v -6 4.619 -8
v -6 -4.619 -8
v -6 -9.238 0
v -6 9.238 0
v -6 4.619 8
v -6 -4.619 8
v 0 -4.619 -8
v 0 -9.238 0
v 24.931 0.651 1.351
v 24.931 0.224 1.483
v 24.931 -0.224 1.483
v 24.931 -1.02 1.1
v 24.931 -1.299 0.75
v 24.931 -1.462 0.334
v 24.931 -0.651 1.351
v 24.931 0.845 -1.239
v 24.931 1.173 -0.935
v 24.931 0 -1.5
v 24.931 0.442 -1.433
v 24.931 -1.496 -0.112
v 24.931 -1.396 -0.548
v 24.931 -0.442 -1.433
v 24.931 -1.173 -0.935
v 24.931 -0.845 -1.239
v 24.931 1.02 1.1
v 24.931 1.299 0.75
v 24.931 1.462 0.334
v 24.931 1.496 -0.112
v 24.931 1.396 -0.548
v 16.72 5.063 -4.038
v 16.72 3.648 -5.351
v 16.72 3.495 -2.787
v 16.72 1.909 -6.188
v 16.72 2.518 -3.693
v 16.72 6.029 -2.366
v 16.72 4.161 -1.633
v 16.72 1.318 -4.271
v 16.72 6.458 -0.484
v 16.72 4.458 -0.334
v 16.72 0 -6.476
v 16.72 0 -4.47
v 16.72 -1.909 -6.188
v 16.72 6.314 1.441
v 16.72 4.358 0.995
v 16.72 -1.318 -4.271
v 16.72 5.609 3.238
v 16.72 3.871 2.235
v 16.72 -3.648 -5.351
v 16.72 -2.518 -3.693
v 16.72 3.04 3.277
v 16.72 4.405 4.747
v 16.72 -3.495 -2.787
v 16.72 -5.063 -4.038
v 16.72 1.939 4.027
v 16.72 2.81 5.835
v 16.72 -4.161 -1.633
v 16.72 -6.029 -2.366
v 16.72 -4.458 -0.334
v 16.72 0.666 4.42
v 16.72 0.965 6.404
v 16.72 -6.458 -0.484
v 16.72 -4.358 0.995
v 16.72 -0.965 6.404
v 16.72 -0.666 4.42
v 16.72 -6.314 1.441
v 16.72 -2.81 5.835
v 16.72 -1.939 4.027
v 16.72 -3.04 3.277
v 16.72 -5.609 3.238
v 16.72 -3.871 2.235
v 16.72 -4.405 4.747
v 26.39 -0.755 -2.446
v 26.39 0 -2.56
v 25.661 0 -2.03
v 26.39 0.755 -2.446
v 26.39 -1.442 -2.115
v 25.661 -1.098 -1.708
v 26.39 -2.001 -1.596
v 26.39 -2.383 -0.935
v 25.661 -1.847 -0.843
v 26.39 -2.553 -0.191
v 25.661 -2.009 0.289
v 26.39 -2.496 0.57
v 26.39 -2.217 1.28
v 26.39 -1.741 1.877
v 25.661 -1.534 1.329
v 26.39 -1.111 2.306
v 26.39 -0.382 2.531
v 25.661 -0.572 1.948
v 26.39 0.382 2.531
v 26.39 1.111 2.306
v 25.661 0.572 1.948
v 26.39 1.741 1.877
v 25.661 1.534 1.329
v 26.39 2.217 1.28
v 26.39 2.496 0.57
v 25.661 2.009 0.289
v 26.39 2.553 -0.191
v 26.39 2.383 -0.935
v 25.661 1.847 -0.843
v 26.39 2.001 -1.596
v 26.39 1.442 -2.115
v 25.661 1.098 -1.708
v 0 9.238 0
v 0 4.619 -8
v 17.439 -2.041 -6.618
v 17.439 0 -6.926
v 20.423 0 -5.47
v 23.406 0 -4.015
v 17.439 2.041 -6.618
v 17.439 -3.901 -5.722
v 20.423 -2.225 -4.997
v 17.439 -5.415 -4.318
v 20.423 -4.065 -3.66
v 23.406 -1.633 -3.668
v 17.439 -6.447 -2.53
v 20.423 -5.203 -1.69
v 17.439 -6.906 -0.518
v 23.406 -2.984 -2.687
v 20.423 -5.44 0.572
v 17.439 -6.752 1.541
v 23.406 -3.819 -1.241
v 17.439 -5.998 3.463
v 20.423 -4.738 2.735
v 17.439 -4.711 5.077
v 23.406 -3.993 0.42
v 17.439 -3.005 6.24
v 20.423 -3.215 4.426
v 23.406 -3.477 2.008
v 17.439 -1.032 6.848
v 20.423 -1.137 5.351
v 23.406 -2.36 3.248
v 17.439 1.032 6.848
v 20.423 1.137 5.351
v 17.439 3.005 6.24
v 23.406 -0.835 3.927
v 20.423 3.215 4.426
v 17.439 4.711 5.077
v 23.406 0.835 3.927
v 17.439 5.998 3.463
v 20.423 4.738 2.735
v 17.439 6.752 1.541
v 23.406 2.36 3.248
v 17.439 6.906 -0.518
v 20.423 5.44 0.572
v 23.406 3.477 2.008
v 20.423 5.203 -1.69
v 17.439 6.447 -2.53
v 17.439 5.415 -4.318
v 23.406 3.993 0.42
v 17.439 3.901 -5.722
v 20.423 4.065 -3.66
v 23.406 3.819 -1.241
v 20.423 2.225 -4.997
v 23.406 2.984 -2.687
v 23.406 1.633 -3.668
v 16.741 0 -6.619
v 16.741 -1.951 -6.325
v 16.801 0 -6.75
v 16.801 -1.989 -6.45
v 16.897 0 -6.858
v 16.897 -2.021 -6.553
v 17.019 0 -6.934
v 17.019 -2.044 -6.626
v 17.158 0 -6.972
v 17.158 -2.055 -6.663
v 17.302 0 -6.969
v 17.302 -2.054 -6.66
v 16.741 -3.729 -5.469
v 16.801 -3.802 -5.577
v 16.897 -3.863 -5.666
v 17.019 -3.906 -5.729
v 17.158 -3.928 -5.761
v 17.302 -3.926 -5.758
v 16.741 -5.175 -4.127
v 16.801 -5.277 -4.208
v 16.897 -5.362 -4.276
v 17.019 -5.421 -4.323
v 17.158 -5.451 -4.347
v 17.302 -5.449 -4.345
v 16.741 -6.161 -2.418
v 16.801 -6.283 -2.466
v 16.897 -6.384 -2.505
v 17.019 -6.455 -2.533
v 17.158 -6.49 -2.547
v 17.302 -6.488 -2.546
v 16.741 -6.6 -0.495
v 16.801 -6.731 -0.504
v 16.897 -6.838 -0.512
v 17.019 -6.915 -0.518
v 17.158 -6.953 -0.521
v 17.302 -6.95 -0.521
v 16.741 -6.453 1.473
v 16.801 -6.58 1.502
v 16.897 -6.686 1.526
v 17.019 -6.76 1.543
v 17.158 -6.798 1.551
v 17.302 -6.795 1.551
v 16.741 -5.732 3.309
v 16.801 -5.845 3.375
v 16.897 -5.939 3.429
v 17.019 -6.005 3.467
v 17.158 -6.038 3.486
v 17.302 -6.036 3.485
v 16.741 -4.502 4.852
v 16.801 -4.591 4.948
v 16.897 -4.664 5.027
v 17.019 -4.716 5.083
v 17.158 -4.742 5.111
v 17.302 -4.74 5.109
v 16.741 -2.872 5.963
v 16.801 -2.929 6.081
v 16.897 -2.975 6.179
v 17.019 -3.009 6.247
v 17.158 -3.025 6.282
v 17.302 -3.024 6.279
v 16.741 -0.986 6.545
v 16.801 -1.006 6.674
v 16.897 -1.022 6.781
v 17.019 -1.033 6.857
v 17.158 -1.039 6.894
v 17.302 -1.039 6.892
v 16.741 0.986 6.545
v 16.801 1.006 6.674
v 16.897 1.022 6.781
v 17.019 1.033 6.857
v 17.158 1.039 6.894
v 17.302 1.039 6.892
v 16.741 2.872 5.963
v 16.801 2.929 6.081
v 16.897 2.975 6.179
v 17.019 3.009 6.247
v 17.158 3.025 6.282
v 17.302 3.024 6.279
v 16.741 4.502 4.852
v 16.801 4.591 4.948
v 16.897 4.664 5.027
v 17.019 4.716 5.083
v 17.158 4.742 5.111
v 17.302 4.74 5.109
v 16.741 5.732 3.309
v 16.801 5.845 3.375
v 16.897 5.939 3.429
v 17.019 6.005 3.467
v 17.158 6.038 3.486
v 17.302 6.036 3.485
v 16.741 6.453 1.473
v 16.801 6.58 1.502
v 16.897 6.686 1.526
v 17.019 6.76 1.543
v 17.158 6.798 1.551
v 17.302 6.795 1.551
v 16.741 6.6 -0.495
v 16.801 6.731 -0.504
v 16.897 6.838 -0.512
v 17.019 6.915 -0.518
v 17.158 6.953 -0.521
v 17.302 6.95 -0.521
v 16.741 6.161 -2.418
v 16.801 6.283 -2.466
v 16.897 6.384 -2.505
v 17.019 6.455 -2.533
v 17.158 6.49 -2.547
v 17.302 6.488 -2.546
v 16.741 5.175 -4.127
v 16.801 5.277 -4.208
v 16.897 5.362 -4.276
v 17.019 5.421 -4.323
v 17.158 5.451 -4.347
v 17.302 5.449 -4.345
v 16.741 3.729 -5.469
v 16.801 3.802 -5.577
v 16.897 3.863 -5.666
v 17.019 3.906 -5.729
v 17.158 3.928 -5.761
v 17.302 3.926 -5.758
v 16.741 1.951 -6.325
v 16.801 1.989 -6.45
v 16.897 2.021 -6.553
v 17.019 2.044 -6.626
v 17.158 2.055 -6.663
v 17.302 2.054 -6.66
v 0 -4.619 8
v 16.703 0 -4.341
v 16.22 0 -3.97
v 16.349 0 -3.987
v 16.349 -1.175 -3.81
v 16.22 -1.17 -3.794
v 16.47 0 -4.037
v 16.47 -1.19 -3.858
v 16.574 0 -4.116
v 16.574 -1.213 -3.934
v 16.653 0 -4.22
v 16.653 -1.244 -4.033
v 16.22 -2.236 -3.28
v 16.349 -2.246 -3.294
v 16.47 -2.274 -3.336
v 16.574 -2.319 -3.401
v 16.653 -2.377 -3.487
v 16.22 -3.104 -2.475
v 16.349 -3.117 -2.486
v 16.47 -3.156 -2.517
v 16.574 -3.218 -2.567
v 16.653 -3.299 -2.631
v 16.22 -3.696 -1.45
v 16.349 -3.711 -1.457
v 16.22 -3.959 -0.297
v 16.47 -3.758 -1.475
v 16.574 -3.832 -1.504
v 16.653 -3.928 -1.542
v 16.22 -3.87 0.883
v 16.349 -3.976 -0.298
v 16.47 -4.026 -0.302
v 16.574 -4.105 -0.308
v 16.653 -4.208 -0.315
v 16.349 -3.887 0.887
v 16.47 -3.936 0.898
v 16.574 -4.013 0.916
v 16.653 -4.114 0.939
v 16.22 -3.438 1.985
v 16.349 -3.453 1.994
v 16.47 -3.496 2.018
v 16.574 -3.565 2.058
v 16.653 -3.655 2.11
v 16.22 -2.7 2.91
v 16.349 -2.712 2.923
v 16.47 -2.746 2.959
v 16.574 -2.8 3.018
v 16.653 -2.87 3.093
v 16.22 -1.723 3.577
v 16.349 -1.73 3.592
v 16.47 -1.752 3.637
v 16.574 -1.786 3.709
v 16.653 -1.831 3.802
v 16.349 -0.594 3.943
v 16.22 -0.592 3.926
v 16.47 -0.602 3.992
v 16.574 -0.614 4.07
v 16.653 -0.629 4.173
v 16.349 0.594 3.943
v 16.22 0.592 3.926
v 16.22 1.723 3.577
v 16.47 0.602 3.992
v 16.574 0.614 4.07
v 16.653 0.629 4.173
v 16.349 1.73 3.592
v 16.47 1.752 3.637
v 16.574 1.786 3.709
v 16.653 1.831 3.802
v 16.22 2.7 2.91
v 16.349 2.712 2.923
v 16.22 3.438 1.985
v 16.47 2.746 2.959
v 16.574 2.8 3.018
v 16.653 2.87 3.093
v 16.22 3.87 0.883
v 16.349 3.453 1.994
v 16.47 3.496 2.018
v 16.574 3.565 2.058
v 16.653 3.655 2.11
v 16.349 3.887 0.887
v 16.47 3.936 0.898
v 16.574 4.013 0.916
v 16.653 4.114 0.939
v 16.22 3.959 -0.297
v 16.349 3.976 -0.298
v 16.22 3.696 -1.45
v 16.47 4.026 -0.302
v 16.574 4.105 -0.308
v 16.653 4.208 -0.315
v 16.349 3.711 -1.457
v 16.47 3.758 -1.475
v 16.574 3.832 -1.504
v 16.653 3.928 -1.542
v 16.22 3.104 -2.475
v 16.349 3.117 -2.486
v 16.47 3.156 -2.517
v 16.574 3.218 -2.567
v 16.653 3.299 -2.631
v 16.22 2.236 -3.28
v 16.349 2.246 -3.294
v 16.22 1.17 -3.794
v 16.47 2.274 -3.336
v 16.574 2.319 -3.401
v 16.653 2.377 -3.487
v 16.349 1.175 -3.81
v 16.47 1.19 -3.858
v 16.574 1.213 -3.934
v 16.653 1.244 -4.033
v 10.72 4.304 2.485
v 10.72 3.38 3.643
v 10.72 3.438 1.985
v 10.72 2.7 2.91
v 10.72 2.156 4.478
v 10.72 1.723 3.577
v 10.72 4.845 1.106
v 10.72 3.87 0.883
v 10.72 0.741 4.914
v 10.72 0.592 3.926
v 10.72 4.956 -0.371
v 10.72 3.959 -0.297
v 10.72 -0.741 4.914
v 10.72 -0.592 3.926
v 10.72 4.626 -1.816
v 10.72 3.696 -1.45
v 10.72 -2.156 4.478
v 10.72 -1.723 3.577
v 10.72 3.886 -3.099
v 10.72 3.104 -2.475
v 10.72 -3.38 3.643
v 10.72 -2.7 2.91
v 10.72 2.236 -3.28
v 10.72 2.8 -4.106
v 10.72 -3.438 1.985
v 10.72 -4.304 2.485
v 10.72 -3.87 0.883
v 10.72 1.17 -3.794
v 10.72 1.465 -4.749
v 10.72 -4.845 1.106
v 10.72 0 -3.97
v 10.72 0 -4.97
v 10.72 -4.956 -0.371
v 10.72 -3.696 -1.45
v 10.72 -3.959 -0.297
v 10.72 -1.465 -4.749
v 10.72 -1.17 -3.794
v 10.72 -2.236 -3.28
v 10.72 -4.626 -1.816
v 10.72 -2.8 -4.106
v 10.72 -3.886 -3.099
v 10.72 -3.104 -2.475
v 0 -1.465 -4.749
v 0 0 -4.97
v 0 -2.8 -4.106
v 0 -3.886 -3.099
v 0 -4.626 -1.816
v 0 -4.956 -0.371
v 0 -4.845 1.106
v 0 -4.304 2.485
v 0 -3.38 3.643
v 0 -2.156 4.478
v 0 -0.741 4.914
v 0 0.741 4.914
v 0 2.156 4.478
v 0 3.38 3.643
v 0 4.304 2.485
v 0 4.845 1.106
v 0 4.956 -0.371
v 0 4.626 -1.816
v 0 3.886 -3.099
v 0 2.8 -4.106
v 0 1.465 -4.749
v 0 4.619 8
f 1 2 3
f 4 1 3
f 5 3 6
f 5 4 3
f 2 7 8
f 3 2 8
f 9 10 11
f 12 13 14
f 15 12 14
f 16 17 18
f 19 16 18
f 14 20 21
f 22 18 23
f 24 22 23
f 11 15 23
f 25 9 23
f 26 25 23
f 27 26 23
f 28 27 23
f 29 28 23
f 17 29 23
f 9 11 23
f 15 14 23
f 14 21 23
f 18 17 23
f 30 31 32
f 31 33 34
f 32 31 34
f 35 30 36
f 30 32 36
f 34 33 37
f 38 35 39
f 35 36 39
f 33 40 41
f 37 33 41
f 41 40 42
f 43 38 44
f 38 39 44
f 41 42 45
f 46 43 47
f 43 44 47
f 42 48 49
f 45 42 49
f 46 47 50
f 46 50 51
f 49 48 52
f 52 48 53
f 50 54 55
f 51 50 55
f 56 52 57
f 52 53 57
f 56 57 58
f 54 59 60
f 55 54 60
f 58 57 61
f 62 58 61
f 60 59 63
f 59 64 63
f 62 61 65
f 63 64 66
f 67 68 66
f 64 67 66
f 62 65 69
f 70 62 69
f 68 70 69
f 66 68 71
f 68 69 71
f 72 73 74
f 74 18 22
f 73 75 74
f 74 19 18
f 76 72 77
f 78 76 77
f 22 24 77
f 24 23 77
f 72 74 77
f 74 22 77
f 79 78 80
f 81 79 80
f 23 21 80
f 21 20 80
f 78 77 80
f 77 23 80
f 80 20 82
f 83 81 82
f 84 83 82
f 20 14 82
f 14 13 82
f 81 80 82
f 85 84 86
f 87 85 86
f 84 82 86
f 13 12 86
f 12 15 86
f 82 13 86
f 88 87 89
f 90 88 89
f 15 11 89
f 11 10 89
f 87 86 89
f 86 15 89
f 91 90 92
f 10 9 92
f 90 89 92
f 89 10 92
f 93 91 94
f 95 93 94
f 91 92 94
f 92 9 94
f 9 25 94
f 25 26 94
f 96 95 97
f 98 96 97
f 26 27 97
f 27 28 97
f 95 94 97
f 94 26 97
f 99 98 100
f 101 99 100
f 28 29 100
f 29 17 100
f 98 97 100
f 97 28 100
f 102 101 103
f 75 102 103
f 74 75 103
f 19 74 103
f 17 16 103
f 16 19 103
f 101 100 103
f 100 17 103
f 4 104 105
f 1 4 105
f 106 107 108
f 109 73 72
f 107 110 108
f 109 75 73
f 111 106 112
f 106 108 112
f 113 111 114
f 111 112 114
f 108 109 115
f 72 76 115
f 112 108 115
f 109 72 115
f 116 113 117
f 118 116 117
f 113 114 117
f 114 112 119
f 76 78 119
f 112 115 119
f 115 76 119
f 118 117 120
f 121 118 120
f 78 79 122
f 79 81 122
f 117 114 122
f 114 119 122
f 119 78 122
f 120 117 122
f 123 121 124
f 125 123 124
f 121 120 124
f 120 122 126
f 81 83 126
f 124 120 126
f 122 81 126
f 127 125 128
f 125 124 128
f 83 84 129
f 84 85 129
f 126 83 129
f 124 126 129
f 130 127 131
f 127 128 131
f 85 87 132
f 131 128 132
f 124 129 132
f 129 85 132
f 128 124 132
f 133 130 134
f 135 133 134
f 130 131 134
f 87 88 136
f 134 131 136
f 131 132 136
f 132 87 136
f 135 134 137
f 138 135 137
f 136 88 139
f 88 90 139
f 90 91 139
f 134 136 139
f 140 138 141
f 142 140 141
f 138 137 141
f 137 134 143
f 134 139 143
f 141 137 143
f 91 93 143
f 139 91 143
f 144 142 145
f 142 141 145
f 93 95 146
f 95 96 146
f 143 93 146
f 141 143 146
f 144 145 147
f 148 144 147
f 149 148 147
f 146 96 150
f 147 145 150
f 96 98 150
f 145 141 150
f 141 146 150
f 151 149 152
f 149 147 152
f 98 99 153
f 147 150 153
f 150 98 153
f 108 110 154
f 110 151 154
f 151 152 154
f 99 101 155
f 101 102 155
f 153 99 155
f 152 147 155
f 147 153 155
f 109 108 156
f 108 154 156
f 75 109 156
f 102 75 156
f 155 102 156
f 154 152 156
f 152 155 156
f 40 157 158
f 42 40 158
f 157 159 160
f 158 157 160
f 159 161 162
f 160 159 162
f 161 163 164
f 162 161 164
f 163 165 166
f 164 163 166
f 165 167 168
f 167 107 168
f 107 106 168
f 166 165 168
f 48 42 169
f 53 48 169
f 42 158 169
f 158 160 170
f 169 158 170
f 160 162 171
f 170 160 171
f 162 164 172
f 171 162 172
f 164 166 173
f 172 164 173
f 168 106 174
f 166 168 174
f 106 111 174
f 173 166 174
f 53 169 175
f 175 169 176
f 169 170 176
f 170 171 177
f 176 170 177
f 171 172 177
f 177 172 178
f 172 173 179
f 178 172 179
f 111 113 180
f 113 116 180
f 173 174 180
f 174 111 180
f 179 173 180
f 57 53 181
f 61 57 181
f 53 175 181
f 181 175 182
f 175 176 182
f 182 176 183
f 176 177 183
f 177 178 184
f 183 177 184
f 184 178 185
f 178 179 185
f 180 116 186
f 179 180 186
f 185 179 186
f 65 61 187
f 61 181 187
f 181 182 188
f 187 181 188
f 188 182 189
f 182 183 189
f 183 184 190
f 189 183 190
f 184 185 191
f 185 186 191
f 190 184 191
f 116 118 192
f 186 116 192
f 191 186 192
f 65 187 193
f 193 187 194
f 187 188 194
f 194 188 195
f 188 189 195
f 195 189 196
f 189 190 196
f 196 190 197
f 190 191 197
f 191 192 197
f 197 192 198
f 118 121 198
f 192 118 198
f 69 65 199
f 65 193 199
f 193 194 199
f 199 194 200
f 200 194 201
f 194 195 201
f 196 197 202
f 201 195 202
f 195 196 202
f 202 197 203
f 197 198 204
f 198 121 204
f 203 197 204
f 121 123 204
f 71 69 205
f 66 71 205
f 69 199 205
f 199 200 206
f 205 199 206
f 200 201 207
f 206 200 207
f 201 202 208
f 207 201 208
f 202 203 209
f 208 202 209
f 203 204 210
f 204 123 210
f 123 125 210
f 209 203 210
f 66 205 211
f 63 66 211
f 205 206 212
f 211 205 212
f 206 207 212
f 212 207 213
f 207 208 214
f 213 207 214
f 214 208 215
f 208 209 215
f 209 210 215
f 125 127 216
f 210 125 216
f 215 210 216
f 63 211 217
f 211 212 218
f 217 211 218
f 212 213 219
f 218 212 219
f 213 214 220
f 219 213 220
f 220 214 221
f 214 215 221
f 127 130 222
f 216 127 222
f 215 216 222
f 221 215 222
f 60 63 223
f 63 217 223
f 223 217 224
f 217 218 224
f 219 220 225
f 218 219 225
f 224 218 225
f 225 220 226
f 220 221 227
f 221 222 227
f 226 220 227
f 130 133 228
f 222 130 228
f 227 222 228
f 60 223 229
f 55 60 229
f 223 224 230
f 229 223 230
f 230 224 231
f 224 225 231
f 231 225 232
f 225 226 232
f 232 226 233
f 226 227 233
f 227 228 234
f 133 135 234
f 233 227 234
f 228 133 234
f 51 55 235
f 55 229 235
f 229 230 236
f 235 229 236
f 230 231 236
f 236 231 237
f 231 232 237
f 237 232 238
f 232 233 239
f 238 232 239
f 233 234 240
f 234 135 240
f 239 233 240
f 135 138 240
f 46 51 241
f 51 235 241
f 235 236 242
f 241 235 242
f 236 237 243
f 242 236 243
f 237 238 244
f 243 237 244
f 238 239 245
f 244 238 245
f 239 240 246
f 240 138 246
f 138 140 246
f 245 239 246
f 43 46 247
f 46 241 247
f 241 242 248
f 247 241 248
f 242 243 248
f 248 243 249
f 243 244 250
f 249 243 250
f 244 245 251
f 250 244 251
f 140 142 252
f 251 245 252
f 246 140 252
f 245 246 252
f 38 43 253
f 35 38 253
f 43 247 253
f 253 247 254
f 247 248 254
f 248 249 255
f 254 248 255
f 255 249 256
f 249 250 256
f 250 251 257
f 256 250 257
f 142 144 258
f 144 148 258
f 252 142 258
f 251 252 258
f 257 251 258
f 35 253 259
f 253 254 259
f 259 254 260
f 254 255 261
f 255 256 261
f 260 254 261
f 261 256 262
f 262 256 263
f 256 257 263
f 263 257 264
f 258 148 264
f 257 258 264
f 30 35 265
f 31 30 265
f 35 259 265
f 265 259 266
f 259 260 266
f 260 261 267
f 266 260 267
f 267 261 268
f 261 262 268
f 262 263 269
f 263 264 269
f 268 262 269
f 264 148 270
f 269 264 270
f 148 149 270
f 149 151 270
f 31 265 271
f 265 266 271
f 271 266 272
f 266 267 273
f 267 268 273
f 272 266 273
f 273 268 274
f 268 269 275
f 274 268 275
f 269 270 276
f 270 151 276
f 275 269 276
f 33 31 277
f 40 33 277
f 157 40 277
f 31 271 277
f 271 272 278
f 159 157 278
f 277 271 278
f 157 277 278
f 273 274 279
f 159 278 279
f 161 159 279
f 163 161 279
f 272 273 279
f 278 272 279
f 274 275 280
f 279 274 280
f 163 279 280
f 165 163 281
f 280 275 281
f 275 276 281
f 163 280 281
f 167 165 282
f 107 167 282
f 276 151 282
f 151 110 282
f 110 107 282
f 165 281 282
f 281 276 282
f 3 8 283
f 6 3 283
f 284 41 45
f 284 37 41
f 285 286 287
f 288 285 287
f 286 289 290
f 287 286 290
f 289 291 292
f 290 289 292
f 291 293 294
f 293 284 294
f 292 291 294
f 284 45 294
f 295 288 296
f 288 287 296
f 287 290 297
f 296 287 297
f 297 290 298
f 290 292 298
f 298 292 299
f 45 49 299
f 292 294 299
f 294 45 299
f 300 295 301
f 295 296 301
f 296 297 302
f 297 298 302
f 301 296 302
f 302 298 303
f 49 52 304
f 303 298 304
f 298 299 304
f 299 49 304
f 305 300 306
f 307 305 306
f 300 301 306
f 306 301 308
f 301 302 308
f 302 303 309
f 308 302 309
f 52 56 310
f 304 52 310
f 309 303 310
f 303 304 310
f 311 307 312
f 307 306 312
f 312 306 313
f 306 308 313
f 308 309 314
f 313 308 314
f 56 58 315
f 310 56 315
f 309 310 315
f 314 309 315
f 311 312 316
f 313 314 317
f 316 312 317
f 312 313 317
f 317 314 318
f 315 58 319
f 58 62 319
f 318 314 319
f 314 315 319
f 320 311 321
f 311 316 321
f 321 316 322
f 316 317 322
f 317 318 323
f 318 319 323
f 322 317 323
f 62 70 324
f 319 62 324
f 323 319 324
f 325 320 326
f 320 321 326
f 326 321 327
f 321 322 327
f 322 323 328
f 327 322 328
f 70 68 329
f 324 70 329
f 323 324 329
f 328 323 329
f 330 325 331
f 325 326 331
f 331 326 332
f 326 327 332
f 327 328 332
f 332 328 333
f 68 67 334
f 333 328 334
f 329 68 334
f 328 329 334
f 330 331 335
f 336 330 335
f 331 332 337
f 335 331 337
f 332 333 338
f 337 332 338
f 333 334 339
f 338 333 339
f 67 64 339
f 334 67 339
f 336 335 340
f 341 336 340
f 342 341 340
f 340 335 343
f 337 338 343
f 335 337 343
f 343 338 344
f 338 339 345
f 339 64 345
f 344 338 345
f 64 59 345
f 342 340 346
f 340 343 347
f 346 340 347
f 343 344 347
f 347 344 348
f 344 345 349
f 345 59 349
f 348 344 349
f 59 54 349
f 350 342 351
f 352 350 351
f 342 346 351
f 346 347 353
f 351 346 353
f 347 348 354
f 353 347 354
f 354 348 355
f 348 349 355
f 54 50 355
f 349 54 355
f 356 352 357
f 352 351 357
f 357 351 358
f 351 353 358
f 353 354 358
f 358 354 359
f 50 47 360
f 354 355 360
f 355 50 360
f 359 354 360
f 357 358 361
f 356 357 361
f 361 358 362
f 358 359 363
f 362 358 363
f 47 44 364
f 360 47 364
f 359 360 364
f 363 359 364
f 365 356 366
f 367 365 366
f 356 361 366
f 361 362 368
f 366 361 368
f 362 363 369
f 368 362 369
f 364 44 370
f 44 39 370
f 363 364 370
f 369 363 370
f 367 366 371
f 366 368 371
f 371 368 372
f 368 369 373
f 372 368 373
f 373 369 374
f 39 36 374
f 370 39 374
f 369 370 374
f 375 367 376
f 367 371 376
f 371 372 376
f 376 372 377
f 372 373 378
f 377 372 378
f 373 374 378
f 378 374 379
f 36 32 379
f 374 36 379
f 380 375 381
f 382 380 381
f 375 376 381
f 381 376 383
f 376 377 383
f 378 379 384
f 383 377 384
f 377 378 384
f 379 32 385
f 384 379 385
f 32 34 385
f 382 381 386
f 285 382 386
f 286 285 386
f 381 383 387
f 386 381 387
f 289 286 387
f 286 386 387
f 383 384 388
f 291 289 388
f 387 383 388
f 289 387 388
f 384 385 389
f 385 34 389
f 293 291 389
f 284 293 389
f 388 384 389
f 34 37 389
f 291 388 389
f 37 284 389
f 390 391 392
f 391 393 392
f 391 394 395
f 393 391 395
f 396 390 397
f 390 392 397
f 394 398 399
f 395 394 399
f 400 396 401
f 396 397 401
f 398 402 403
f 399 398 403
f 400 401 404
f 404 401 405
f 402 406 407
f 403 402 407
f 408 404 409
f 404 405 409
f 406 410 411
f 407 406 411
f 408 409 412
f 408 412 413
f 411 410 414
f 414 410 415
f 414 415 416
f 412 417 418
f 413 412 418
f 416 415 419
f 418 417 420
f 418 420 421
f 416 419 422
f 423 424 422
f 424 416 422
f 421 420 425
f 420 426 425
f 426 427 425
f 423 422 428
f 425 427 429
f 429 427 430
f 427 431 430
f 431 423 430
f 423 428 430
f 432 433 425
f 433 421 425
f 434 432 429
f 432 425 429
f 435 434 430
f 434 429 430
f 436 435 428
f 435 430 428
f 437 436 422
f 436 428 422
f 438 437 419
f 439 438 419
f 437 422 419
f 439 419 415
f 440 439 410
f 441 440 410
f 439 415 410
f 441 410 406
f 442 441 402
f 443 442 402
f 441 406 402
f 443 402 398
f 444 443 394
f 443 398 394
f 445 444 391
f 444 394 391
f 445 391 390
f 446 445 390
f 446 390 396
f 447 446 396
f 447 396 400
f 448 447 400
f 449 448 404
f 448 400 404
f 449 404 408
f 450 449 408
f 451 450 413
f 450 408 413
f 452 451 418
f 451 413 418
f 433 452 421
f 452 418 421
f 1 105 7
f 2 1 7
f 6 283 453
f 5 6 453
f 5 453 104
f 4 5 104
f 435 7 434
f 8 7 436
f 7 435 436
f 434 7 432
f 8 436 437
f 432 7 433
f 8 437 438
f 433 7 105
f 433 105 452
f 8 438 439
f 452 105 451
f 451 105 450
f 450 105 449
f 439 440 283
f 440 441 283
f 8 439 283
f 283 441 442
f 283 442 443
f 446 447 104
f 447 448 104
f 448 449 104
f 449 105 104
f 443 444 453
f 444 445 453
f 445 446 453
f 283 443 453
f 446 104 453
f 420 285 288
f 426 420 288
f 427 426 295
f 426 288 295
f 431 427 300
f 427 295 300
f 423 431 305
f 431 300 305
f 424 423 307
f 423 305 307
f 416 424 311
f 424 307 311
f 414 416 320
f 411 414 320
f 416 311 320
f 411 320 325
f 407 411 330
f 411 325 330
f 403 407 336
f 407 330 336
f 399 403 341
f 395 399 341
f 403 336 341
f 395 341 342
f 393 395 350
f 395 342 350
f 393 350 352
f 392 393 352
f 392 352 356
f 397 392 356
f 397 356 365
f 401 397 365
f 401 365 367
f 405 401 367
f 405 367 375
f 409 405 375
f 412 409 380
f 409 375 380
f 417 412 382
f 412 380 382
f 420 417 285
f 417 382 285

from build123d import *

# Parameters (mm, degrees)
BOSS_EXTRUDE1_DEPTH = 6
FILLET2_R           = 0.5


with BuildPart() as part:
    # Sketch1 → Revolve1 (revolve)
    with BuildSketch(Plane.XY, mode=Mode.PRIVATE) as revolve1_sk:
        Polygon((0, 0), (0, 4.97), (10.72, 4.97), (10.72, 3.97), (16.72, 3.97), (16.72, 7.276374131), (26.39, 2.56), (24.931035164, 1.5), (24.931035164, 0), align=None)
    revolve(revolve1_sk.sketch.rotate(Axis((24.931035164, 0, 0), (-1, 0, 0)), 90), axis=Axis((24.931035164, 0, 0), (-1, 0, 0)))

    # Sketch2 → Boss-Extrude1 (add)
    with BuildSketch(Plane.ZY):
        Polygon((0, 9.237604307), (-8, 4.618802154), (-8, -4.618802154), (0, -9.237604307), (8, -4.618802154), (8, 4.618802154), align=None)
    extrude(amount=BOSS_EXTRUDE1_DEPTH)

    # Fillet2
    fillet2_edges = [part.edges().sort_by_distance(p)[0] for p in [
        (16.72, 0, 7.276374131),
        (16.72, 0, 3.97),
    ]]
    fillet(fillet2_edges, radius=FILLET2_R)


solid = part.part
